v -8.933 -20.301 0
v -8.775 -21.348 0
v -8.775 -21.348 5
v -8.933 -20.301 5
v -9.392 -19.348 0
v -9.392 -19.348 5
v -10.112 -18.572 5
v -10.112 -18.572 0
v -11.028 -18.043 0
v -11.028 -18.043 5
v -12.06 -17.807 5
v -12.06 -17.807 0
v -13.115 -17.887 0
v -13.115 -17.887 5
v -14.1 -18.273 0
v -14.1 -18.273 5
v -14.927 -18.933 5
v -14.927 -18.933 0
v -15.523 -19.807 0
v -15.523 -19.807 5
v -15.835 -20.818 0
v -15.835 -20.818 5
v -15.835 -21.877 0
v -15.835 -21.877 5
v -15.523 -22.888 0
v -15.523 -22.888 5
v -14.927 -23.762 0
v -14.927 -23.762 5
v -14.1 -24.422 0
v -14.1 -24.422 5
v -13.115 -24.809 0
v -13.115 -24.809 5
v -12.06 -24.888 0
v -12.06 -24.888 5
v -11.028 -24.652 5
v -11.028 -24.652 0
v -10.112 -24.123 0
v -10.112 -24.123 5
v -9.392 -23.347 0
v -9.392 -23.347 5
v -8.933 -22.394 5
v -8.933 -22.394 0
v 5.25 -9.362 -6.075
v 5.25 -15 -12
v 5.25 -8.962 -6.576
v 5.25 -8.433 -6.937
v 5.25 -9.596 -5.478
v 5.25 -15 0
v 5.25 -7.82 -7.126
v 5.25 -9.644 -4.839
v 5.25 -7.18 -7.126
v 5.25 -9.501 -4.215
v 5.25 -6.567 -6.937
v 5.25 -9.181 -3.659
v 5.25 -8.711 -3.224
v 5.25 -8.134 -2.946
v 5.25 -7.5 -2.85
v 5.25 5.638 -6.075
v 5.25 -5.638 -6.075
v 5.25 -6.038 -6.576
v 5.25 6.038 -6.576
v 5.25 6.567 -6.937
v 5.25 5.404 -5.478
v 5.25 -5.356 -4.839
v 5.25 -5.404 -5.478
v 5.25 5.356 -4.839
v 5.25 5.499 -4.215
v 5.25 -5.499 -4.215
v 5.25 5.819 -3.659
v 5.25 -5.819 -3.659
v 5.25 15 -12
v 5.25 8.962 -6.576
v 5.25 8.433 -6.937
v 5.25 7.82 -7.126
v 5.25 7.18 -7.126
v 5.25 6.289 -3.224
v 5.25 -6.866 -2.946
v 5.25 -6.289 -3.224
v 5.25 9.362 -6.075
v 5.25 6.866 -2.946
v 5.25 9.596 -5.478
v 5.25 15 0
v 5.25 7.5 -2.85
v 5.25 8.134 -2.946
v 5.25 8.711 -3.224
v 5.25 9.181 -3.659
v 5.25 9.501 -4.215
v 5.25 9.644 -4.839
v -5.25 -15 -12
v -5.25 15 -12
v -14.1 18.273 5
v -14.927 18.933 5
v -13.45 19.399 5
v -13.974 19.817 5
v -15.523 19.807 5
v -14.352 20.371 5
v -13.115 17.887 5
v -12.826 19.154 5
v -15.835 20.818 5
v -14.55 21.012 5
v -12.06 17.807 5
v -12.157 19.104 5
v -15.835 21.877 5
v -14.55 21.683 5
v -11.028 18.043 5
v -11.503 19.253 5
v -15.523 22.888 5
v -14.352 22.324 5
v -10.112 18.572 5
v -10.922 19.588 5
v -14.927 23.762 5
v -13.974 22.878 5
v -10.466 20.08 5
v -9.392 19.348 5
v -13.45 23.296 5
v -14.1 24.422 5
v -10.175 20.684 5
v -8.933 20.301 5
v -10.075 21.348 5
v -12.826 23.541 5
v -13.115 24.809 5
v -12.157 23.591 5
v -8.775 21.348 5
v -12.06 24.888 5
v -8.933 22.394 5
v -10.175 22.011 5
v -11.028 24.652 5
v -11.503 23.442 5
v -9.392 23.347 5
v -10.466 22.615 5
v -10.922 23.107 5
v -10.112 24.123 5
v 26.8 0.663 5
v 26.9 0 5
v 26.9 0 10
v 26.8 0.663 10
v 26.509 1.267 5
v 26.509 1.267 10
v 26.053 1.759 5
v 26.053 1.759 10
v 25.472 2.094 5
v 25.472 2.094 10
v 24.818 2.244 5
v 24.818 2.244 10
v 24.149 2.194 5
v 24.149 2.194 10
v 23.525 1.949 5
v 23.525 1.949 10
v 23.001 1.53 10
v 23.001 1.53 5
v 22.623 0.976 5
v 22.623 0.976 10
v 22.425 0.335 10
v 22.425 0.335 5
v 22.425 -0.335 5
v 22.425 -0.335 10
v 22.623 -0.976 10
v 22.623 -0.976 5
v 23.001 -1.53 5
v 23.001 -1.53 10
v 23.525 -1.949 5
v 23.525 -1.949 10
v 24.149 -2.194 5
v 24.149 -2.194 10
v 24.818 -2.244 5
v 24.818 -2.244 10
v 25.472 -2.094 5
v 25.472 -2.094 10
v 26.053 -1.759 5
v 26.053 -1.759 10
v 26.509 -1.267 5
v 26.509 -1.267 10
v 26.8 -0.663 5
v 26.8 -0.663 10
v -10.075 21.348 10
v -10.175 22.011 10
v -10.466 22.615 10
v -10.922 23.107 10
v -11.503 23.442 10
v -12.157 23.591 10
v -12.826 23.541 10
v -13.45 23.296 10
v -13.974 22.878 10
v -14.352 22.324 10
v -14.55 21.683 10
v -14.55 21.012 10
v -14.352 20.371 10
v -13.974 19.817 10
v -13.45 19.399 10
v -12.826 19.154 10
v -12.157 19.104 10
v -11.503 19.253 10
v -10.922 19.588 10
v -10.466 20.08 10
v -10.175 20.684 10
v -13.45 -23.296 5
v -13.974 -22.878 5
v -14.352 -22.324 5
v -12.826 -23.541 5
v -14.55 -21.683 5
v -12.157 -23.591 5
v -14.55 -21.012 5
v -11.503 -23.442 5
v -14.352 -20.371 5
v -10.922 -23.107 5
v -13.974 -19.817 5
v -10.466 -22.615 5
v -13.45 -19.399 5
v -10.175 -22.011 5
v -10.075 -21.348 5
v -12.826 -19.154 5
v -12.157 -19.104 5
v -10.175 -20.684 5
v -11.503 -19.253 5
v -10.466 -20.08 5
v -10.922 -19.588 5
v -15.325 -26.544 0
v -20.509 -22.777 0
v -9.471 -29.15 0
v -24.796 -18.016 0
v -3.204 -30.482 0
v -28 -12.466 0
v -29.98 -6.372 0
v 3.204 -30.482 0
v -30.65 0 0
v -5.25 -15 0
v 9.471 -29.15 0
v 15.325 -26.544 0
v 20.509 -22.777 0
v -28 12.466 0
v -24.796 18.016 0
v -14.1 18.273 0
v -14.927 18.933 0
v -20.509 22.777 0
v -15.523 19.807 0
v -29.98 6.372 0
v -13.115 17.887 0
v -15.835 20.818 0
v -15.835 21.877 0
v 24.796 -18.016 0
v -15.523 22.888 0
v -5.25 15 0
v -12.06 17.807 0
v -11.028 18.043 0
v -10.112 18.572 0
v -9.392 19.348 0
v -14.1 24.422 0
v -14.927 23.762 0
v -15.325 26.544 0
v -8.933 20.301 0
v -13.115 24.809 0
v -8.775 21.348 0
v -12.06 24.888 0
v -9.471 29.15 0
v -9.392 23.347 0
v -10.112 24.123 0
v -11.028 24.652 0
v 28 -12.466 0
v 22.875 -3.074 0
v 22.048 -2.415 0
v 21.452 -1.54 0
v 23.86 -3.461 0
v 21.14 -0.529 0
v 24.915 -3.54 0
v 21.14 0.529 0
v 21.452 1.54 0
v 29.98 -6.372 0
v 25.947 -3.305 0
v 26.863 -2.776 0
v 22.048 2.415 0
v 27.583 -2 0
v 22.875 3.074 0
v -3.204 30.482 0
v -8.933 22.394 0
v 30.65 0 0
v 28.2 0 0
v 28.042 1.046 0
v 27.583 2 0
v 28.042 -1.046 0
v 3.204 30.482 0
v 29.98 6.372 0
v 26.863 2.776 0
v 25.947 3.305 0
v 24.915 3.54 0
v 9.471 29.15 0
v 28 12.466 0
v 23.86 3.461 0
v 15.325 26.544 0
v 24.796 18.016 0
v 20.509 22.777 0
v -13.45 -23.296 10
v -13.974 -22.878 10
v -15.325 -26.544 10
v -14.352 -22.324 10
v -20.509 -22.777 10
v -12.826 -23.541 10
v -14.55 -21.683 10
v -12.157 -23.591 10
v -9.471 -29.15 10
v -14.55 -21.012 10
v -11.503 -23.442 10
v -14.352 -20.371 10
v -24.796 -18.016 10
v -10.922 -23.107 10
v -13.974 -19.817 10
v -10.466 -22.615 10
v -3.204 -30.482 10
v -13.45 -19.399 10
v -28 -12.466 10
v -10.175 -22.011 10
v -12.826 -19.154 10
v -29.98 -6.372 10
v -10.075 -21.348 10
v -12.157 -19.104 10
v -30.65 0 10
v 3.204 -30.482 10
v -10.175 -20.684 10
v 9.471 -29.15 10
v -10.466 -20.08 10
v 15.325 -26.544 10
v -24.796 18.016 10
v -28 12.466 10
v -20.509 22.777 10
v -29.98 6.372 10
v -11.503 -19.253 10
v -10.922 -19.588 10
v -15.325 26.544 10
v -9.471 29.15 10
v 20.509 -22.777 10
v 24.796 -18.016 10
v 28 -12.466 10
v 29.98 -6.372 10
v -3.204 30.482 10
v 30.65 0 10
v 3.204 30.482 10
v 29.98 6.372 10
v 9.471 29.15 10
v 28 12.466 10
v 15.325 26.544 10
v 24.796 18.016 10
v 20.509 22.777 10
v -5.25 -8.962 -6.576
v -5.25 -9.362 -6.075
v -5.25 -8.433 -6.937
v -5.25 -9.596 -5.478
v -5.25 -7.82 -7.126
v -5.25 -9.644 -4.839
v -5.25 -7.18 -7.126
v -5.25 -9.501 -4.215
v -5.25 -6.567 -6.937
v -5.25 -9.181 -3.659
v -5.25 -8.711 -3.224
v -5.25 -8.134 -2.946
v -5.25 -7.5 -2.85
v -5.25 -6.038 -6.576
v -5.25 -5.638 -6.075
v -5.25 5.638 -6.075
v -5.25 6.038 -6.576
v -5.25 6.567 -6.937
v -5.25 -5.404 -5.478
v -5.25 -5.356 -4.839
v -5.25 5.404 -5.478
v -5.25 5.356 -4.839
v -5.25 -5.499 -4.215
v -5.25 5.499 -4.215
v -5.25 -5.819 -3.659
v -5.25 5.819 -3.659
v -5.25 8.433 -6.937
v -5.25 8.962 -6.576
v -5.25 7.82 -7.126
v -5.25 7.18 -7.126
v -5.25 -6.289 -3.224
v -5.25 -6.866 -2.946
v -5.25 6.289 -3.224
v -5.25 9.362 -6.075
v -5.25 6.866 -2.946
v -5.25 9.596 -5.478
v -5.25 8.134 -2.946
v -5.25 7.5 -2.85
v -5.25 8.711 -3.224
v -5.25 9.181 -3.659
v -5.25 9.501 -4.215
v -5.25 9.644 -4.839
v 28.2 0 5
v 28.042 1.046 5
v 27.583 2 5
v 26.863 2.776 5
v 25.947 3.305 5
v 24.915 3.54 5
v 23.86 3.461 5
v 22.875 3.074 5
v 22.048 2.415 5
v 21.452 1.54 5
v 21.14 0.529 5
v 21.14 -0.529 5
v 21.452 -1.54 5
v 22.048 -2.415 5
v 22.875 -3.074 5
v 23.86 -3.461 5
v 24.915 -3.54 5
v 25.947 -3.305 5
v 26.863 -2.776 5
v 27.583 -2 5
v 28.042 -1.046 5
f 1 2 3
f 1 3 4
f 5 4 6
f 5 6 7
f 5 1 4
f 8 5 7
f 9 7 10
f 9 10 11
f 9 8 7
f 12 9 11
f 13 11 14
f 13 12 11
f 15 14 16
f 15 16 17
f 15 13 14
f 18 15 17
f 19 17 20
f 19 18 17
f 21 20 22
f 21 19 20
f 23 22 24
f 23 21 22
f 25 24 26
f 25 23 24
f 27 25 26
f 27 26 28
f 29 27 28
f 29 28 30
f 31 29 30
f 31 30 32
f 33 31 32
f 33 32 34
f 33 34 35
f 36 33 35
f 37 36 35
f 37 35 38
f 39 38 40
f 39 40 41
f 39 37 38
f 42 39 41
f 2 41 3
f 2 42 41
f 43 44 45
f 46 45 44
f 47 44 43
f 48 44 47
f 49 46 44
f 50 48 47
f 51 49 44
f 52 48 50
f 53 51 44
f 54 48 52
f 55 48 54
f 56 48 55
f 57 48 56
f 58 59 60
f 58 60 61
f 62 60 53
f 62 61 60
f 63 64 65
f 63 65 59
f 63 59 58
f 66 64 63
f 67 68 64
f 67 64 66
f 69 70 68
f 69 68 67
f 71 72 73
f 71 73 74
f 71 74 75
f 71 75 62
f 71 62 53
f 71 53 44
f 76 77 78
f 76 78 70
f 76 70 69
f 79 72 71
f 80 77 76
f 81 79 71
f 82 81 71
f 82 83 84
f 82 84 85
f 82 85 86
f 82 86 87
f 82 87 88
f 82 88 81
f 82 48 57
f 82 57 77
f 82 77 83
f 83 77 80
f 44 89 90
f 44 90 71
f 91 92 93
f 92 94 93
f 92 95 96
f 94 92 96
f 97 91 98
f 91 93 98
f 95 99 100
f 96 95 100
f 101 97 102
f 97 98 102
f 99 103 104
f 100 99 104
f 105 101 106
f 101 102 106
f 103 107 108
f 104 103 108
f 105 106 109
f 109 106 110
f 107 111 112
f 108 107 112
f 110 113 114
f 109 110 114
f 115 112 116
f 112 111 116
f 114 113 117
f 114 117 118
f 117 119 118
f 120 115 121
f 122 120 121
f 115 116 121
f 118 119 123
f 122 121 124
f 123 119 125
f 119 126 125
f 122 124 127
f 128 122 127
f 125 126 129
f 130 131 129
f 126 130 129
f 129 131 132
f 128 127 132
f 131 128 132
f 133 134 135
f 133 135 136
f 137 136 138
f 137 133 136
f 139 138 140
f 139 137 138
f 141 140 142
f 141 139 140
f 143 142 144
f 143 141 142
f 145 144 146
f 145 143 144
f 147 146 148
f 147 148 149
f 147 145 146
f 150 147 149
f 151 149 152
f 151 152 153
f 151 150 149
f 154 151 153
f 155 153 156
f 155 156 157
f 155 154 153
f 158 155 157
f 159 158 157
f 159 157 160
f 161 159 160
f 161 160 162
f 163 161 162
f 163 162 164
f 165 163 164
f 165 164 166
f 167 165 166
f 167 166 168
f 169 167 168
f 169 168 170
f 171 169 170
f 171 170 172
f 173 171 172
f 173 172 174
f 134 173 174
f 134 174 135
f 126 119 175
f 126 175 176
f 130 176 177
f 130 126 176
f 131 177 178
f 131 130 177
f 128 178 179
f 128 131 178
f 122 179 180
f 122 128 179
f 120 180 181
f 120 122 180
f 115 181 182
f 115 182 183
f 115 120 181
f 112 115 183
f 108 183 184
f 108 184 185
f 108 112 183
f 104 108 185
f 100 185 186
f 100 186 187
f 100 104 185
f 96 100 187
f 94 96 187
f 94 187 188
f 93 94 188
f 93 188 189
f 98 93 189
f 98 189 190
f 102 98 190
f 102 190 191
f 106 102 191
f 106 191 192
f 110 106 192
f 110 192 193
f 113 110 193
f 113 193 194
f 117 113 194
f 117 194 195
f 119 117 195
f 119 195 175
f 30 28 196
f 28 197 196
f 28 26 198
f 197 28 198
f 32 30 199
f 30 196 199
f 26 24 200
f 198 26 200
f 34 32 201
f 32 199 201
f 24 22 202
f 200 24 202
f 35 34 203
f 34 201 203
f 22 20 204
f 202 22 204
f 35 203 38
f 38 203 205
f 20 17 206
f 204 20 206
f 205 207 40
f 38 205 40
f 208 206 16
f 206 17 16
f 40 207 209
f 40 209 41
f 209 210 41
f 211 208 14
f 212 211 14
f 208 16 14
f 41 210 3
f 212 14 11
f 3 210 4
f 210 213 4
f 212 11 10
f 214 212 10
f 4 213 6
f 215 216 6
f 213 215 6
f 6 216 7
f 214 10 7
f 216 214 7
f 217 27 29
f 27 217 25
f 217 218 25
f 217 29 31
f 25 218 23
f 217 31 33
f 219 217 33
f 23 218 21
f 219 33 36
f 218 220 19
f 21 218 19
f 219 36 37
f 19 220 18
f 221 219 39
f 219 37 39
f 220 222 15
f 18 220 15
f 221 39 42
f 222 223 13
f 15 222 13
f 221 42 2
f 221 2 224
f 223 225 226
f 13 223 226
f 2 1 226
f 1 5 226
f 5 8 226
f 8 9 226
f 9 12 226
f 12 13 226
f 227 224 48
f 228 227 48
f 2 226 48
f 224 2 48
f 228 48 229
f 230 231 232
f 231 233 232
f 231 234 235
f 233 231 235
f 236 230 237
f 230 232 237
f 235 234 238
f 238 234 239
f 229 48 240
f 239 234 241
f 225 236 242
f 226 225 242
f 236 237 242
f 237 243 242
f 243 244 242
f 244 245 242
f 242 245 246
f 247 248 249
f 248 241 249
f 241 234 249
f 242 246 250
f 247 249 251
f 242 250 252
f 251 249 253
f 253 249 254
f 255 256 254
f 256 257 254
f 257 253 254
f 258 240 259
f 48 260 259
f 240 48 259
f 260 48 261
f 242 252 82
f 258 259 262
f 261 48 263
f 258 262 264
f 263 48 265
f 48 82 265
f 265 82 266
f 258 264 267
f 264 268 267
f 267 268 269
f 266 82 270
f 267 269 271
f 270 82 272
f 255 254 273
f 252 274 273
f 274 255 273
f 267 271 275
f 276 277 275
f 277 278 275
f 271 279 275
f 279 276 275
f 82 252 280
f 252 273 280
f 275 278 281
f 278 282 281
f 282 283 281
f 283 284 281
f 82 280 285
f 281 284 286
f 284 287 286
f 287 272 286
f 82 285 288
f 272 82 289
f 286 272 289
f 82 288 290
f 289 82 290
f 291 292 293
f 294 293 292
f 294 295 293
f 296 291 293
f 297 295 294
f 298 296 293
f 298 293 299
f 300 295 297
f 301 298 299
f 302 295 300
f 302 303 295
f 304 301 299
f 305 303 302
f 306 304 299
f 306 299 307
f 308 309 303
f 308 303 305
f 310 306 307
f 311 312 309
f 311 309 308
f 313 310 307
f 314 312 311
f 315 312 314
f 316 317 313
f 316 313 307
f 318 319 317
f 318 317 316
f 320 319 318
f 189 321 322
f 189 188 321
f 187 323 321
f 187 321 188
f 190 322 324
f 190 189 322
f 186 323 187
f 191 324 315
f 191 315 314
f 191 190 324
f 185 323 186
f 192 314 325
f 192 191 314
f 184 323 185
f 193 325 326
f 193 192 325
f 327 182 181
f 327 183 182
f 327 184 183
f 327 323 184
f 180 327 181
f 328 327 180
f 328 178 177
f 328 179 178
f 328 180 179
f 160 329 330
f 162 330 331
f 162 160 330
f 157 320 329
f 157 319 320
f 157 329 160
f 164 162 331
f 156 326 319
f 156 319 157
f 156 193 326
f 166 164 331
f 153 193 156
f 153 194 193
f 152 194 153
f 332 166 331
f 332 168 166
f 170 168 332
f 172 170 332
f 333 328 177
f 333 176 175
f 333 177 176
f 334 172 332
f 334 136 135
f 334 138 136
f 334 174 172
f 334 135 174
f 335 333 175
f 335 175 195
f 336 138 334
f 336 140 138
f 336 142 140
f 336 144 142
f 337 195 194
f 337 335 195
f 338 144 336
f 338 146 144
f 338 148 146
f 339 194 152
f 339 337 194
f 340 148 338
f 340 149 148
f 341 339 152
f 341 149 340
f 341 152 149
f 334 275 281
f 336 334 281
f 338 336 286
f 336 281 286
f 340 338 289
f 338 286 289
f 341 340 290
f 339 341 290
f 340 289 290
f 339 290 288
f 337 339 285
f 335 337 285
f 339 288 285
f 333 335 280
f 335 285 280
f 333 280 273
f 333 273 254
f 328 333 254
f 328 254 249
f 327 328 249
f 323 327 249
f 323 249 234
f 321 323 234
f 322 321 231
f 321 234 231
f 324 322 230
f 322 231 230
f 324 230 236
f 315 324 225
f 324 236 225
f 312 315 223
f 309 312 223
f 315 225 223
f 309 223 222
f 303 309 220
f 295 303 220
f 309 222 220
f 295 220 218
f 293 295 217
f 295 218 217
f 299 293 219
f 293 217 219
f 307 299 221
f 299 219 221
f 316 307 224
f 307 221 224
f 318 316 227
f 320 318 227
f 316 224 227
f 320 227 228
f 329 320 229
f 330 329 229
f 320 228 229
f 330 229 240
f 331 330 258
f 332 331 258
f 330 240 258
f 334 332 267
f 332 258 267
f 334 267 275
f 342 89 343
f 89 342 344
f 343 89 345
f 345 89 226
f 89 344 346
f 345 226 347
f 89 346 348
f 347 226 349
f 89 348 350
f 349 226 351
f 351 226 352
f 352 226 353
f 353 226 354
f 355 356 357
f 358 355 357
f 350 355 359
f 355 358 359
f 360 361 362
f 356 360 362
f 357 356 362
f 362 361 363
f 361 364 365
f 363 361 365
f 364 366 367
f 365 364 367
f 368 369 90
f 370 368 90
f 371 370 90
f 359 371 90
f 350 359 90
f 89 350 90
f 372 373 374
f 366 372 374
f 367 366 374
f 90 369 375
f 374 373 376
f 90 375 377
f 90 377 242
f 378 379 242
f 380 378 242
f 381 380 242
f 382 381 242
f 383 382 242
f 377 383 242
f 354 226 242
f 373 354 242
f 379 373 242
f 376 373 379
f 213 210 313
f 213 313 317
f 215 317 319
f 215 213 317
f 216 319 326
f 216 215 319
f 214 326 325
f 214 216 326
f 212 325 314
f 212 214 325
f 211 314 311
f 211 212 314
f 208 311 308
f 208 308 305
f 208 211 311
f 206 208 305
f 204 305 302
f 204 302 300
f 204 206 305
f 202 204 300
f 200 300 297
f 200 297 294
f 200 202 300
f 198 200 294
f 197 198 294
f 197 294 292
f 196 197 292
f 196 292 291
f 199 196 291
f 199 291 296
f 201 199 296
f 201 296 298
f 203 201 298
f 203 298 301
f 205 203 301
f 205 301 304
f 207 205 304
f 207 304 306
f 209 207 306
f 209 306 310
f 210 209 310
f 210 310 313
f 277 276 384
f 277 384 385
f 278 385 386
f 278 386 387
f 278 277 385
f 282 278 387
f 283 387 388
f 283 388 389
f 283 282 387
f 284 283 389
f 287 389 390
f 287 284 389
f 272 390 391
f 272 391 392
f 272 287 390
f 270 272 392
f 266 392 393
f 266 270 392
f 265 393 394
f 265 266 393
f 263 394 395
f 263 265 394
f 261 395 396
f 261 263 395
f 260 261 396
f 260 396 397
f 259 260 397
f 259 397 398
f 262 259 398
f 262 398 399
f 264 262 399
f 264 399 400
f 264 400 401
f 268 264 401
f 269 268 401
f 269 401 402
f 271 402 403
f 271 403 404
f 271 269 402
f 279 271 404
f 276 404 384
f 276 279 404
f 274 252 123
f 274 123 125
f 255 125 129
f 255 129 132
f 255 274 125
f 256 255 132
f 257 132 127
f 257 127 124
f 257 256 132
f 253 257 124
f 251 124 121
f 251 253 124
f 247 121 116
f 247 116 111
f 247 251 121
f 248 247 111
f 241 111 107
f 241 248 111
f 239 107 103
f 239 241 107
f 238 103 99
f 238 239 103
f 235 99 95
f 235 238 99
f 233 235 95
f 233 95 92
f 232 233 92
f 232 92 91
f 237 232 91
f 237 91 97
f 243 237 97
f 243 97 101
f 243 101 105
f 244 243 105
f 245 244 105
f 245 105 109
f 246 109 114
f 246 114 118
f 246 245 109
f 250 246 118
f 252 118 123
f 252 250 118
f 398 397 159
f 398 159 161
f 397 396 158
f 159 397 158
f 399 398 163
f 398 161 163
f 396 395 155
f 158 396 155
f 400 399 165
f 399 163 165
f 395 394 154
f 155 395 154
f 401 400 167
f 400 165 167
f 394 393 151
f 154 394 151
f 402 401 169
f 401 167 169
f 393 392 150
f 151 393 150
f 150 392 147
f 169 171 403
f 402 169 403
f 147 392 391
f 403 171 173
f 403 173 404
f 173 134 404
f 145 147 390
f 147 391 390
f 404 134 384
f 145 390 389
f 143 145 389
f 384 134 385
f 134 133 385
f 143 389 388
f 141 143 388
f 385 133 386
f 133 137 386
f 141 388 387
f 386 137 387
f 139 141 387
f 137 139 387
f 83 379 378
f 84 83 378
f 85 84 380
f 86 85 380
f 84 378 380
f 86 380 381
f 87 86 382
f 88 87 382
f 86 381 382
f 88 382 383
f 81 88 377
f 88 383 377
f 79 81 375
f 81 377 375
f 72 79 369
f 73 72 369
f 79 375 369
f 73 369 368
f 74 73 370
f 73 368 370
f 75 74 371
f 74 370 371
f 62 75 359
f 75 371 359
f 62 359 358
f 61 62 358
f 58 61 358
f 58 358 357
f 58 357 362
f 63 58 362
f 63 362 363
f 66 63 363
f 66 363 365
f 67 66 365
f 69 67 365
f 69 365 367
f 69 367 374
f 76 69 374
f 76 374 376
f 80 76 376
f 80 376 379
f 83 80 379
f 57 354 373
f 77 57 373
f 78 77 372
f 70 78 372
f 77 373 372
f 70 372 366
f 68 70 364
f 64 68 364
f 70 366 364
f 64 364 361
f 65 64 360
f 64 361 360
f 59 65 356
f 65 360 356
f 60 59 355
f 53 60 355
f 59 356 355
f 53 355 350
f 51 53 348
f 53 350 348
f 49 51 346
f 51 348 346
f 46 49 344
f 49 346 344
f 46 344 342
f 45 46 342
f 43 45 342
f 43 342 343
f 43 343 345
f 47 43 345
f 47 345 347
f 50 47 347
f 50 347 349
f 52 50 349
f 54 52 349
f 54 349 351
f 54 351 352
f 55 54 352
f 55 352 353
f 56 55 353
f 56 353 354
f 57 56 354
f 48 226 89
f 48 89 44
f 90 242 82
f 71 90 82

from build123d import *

# Parameters (mm, degrees)
SKETCH_288_R           = 30.65
SKETCH_288_R_2         = 2.25
EXTRUDE_1509_DEPTH     = 10
SKETCH_1_3_R           = 3.55
SKETCH_1_3_R_2         = 2.25
CUT_EXTRUDE_1553_DEPTH = 5
SKETCH_1_5_W           = 10.5
SKETCH_1_5_H           = 30
EXTRUDE_2_DEPTH        = 12
CUT_EXTRUDE_2473_REACH = 50.706
SKETCH_2180_R          = 2.15


with BuildPart() as part:
    # Sketch 288 → Extrude 1509 (new body)
    with BuildSketch(Plane.XY):
        Circle(SKETCH_288_R)
        with Locations((24.65, 0)):
            Circle(SKETCH_288_R_2, mode=Mode.SUBTRACT)
        with Locations((-12.325, -21.347526203)):
            Circle(SKETCH_288_R_2, mode=Mode.SUBTRACT)
        with Locations((-12.325, 21.347526203)):
            Circle(SKETCH_288_R_2, mode=Mode.SUBTRACT)
    extrude(amount=EXTRUDE_1509_DEPTH)

    # Эскиз1<3> → Cut-Extrude 1553 (cut)
    # profile 1 of 3: a face of its own
    with BuildSketch(Plane.XY):
        with Locations((24.65, 0)):
            Circle(SKETCH_1_3_R)
        with Locations((24.65, 0)):
            Circle(SKETCH_1_3_R_2, mode=Mode.SUBTRACT)
    # profile 2 of 3: a face of its own
    with BuildSketch(Plane.XY):
        with Locations((-12.325, 21.347526203)):
            Circle(SKETCH_1_3_R)
        with Locations((-12.325, 21.347526203)):
            Circle(SKETCH_1_3_R_2, mode=Mode.SUBTRACT)
    # profile 3 of 3: a face of its own
    with BuildSketch(Plane.XY):
        with Locations((-12.325, -21.347526203)):
            Circle(SKETCH_1_3_R)
        with Locations((-12.325, -21.347526203)):
            Circle(SKETCH_1_3_R_2, mode=Mode.SUBTRACT)
    extrude(amount=CUT_EXTRUDE_1553_DEPTH, mode=Mode.SUBTRACT)

    # Эскиз1<5> → Бобышка-Вытянуть2 (add)
    with BuildSketch(Plane.XY):
        Rectangle(SKETCH_1_5_W, SKETCH_1_5_H)
    extrude(amount=-EXTRUDE_2_DEPTH)

    # Sketch 2180 → Cut-Extrude 2473 (cut, up to next)
    with BuildSketch(Plane.ZY.offset(5.25), mode=Mode.PRIVATE) as cut_extrude_2473_sk1:
        with Locations((-5, 7.5)):
            Circle(SKETCH_2180_R)
    cut_extrude_2473_tool1 = extrude(cut_extrude_2473_sk1.sketch, amount=-CUT_EXTRUDE_2473_REACH, mode=Mode.PRIVATE) & part.part
    # Sketch 2180 → Cut-Extrude 2473 (cut, up to next)
    with BuildSketch(Plane.ZY.offset(5.25), mode=Mode.PRIVATE) as cut_extrude_2473_sk2:
        with Locations((-5, -7.5)):
            Circle(SKETCH_2180_R)
    cut_extrude_2473_tool2 = extrude(cut_extrude_2473_sk2.sketch, amount=-CUT_EXTRUDE_2473_REACH, mode=Mode.PRIVATE) & part.part
    add(cut_extrude_2473_tool1.solids().sort_by_distance((-5.25, 7.5, -5))[0], mode=Mode.SUBTRACT)
    add(cut_extrude_2473_tool2.solids().sort_by_distance((-5.25, -7.5, -5))[0], mode=Mode.SUBTRACT)


solid = part.part
